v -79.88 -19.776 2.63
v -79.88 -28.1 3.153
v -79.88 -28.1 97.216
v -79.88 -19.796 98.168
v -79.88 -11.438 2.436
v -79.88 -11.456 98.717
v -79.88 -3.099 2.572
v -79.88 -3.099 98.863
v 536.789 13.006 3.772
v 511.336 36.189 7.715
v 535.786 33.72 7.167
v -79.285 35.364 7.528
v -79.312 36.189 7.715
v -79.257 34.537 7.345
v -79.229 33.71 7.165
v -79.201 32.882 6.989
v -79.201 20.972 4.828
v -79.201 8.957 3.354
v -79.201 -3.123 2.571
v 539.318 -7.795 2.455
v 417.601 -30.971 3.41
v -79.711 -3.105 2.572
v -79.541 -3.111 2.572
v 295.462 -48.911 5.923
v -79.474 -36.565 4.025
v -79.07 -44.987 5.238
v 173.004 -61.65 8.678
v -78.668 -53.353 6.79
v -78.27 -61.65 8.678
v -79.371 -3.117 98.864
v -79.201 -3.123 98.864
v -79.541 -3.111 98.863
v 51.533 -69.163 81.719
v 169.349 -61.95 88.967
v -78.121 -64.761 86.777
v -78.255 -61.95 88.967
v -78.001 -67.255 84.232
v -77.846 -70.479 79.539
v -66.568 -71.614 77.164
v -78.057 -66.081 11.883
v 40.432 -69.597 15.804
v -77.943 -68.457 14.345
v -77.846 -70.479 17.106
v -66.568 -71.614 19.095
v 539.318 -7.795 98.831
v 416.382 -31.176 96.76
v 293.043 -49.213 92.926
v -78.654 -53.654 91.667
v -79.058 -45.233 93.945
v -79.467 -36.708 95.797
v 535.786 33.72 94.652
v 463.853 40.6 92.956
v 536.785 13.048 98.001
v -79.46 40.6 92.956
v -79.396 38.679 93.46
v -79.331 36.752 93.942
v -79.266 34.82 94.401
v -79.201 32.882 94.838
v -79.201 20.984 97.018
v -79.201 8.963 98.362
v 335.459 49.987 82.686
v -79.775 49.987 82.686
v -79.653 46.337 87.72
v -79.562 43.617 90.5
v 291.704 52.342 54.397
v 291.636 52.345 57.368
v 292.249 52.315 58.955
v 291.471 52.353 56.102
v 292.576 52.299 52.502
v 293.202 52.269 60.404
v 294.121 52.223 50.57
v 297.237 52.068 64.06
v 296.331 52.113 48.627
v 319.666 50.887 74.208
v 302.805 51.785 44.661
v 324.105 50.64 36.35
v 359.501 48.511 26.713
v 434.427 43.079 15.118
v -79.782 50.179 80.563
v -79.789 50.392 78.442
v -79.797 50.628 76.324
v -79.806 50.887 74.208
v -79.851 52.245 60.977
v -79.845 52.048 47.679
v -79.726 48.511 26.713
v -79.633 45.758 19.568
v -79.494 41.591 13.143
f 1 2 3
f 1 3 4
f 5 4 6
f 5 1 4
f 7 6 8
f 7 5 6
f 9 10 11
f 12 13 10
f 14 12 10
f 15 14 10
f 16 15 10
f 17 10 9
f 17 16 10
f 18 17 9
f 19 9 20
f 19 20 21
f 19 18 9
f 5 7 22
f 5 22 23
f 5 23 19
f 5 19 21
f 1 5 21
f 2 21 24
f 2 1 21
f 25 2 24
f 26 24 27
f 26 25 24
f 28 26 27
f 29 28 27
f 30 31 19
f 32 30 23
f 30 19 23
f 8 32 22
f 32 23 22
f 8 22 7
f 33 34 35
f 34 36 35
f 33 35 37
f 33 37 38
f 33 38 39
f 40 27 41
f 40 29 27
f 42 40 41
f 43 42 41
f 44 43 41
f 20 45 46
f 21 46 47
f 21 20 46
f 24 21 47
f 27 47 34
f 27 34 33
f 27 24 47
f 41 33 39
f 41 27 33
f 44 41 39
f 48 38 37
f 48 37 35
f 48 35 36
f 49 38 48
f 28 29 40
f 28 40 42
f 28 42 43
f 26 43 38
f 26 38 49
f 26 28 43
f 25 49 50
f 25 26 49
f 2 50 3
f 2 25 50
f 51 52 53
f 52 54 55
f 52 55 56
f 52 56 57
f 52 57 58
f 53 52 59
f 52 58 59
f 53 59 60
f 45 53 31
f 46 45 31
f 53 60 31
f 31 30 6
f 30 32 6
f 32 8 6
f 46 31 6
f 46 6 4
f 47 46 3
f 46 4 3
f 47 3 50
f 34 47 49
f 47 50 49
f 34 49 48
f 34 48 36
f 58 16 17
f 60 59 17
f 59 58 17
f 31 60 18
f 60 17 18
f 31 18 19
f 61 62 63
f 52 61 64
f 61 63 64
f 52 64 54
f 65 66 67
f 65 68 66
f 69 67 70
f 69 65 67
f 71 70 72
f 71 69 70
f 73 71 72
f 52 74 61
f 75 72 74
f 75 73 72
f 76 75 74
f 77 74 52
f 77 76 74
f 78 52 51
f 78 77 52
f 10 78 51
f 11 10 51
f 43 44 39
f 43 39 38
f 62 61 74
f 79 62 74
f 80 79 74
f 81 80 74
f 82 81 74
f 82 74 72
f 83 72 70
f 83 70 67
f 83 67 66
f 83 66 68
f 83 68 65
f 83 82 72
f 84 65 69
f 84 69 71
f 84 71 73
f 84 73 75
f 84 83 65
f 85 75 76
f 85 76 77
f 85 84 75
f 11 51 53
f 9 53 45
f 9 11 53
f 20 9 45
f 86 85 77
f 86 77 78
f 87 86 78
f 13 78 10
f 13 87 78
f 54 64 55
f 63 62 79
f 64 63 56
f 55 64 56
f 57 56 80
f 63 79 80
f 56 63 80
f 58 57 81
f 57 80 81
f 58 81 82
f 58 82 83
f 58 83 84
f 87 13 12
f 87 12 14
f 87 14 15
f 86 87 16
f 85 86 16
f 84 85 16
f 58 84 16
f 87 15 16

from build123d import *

# Parameters (mm, degrees)
BOSS_EXTRUDE1_DEPTH     = 100
CUT_EXTRUDE3_DEPTH      = 554.165701555
CUT_EXTRUDE3_DEPTH_BACK = 554.165701555
CUT_EXTRUDE5_DEPTH      = 553.962044682
CUT_EXTRUDE5_DEPTH_BACK = 553.962044682
CUT_EXTRUDE7_DEPTH      = 553.962044682
CUT_EXTRUDE7_DEPTH_BACK = 553.962044682
CUT_EXTRUDE9_DEPTH      = 553.962044682
CUT_EXTRUDE9_DEPTH_BACK = 553.962044682


with BuildPart() as part:
    # Sketch1 → Boss-Extrude1 (new body)
    with BuildSketch(Plane.XY):
        with BuildLine():
            ThreePointArc((-192.629438793, 0), (-136.135725272, 33.719619965), (-73.991525193, 55.321722514))
            ThreePointArc((-73.991525193, 55.321722514), (231.264395529, 54.89097703), (535.785554592, 33.719619965))
            ThreePointArc((535.785554592, 33.719619965), (536.798211586, 12.89819156), (539.317827414, -7.795017256))
            ThreePointArc((539.317827414, -7.795017256), (238.042039648, -55.533392614), (-66.568309368, -71.614065728))
            ThreePointArc((-66.568309368, -71.614065728), (-137.800866021, -50.244872094), (-192.629438793, 0))
        make_face()
    extrude(amount=BOSS_EXTRUDE1_DEPTH)

    # Sketch2 → Cut-Extrude3 (cut, two sides: drawn at the far end of the back side and taken through both)
    with BuildSketch(Plane(origin=(0, 0, 0), x_dir=(0, 0, -1), z_dir=(1, 0, 0)).offset(-CUT_EXTRUDE3_DEPTH_BACK)):
        with BuildLine():
            ThreePointArc((-65.447202994, 54.830423707), (-80.892507985, 50.983746932), (-92.956496986, 40.600368972))
            ThreePointArc((-92.956496986, 40.600368972), (-98.736407831, -10.977338679), (-88.967303886, -61.950193259))
            ThreePointArc((-88.967303886, -61.950193259), (-83.10915251, -68.165990231), (-75.589128758, -72.216090516))
            ThreePointArc((-75.589128758, -72.216090516), (-123.822815089, -94.064788666), (-173.378544397, -75.407784602))
            ThreePointArc((-173.378544397, -75.407784602), (-163.802190068, -4.583325871), (-135.262897635, 60.940099743))
            ThreePointArc((-135.262897635, 60.940099743), (-100.366866686, 80.430667917), (-61.326949176, 89.003885783))
            ThreePointArc((-61.326949176, 89.003885783), (-63.560434952, 71.938056418), (-65.447202994, 54.830423707))
        make_face()
    extrude(amount=CUT_EXTRUDE3_DEPTH + CUT_EXTRUDE3_DEPTH_BACK, mode=Mode.SUBTRACT)

    # Sketch3 → Cut-Extrude5 (cut, two sides: drawn at the far end of the back side and taken through both)
    with BuildSketch(Plane(origin=(0, 0, 0), x_dir=(0, 0, -1), z_dir=(1, 0, 0)).offset(-CUT_EXTRUDE5_DEPTH_BACK)):
        with BuildLine():
            ThreePointArc((-74.208303325, 50.886642831), (-50.335012976, 52.211638999), (-26.713093985, 48.511024166))
            ThreePointArc((-26.713093985, 48.511024166), (-16.247111553, 43.841102683), (-7.714956491, 36.189482926))
            ThreePointArc((-7.714956491, 36.189482926), (-2.445034952, -12.786836037), (-8.678058045, -61.649923489))
            ThreePointArc((-8.678058045, -61.649923489), (-17.453523943, -70.69509128), (-29.511303704, -74.360307413))
            ThreePointArc((-29.511303704, -74.360307413), (33.955140221, -79.826327987), (85.286434054, -42.104117568))
            ThreePointArc((85.286434054, -42.104117568), (41.180066923, 16.064388488), (12.319514625, 83.116720583))
            ThreePointArc((12.319514625, 83.116720583), (-170.558095104, 441.821406771), (-74.208303325, 50.886642831))
        make_face()
    extrude(amount=CUT_EXTRUDE5_DEPTH + CUT_EXTRUDE5_DEPTH_BACK, mode=Mode.SUBTRACT)

    # Sketch4 → Cut-Extrude7 (cut, two sides: drawn at the far end of the back side and taken through both)
    with BuildSketch(Plane.XY.offset(-CUT_EXTRUDE7_DEPTH_BACK)):
        Polygon((-79.201401397, 32.882000093), (-79.201401397, -3.122719846), (-222.768125928, 1.814195624), (-233.222282556, 17.110218535), (-80.529357675, 72.456896947), align=None)
    extrude(amount=CUT_EXTRUDE7_DEPTH + CUT_EXTRUDE7_DEPTH_BACK, mode=Mode.SUBTRACT)

    # Sketch7 → Cut-Extrude9 (cut, two sides: drawn at the far end of the back side and taken through both)
    with BuildSketch(Plane.XY.offset(-CUT_EXTRUDE9_DEPTH_BACK)):
        Polygon((-77.622682663, -75.13174066), (-79.880490969, -28.10031394), (-79.880490969, 8.416039234), (-244.452163016, 8.416039234), (-180.732611766, -79.468551396), (-149.591071412, -109.159665737), align=None)
    extrude(amount=CUT_EXTRUDE9_DEPTH + CUT_EXTRUDE9_DEPTH_BACK, mode=Mode.SUBTRACT)


solid = part.part
